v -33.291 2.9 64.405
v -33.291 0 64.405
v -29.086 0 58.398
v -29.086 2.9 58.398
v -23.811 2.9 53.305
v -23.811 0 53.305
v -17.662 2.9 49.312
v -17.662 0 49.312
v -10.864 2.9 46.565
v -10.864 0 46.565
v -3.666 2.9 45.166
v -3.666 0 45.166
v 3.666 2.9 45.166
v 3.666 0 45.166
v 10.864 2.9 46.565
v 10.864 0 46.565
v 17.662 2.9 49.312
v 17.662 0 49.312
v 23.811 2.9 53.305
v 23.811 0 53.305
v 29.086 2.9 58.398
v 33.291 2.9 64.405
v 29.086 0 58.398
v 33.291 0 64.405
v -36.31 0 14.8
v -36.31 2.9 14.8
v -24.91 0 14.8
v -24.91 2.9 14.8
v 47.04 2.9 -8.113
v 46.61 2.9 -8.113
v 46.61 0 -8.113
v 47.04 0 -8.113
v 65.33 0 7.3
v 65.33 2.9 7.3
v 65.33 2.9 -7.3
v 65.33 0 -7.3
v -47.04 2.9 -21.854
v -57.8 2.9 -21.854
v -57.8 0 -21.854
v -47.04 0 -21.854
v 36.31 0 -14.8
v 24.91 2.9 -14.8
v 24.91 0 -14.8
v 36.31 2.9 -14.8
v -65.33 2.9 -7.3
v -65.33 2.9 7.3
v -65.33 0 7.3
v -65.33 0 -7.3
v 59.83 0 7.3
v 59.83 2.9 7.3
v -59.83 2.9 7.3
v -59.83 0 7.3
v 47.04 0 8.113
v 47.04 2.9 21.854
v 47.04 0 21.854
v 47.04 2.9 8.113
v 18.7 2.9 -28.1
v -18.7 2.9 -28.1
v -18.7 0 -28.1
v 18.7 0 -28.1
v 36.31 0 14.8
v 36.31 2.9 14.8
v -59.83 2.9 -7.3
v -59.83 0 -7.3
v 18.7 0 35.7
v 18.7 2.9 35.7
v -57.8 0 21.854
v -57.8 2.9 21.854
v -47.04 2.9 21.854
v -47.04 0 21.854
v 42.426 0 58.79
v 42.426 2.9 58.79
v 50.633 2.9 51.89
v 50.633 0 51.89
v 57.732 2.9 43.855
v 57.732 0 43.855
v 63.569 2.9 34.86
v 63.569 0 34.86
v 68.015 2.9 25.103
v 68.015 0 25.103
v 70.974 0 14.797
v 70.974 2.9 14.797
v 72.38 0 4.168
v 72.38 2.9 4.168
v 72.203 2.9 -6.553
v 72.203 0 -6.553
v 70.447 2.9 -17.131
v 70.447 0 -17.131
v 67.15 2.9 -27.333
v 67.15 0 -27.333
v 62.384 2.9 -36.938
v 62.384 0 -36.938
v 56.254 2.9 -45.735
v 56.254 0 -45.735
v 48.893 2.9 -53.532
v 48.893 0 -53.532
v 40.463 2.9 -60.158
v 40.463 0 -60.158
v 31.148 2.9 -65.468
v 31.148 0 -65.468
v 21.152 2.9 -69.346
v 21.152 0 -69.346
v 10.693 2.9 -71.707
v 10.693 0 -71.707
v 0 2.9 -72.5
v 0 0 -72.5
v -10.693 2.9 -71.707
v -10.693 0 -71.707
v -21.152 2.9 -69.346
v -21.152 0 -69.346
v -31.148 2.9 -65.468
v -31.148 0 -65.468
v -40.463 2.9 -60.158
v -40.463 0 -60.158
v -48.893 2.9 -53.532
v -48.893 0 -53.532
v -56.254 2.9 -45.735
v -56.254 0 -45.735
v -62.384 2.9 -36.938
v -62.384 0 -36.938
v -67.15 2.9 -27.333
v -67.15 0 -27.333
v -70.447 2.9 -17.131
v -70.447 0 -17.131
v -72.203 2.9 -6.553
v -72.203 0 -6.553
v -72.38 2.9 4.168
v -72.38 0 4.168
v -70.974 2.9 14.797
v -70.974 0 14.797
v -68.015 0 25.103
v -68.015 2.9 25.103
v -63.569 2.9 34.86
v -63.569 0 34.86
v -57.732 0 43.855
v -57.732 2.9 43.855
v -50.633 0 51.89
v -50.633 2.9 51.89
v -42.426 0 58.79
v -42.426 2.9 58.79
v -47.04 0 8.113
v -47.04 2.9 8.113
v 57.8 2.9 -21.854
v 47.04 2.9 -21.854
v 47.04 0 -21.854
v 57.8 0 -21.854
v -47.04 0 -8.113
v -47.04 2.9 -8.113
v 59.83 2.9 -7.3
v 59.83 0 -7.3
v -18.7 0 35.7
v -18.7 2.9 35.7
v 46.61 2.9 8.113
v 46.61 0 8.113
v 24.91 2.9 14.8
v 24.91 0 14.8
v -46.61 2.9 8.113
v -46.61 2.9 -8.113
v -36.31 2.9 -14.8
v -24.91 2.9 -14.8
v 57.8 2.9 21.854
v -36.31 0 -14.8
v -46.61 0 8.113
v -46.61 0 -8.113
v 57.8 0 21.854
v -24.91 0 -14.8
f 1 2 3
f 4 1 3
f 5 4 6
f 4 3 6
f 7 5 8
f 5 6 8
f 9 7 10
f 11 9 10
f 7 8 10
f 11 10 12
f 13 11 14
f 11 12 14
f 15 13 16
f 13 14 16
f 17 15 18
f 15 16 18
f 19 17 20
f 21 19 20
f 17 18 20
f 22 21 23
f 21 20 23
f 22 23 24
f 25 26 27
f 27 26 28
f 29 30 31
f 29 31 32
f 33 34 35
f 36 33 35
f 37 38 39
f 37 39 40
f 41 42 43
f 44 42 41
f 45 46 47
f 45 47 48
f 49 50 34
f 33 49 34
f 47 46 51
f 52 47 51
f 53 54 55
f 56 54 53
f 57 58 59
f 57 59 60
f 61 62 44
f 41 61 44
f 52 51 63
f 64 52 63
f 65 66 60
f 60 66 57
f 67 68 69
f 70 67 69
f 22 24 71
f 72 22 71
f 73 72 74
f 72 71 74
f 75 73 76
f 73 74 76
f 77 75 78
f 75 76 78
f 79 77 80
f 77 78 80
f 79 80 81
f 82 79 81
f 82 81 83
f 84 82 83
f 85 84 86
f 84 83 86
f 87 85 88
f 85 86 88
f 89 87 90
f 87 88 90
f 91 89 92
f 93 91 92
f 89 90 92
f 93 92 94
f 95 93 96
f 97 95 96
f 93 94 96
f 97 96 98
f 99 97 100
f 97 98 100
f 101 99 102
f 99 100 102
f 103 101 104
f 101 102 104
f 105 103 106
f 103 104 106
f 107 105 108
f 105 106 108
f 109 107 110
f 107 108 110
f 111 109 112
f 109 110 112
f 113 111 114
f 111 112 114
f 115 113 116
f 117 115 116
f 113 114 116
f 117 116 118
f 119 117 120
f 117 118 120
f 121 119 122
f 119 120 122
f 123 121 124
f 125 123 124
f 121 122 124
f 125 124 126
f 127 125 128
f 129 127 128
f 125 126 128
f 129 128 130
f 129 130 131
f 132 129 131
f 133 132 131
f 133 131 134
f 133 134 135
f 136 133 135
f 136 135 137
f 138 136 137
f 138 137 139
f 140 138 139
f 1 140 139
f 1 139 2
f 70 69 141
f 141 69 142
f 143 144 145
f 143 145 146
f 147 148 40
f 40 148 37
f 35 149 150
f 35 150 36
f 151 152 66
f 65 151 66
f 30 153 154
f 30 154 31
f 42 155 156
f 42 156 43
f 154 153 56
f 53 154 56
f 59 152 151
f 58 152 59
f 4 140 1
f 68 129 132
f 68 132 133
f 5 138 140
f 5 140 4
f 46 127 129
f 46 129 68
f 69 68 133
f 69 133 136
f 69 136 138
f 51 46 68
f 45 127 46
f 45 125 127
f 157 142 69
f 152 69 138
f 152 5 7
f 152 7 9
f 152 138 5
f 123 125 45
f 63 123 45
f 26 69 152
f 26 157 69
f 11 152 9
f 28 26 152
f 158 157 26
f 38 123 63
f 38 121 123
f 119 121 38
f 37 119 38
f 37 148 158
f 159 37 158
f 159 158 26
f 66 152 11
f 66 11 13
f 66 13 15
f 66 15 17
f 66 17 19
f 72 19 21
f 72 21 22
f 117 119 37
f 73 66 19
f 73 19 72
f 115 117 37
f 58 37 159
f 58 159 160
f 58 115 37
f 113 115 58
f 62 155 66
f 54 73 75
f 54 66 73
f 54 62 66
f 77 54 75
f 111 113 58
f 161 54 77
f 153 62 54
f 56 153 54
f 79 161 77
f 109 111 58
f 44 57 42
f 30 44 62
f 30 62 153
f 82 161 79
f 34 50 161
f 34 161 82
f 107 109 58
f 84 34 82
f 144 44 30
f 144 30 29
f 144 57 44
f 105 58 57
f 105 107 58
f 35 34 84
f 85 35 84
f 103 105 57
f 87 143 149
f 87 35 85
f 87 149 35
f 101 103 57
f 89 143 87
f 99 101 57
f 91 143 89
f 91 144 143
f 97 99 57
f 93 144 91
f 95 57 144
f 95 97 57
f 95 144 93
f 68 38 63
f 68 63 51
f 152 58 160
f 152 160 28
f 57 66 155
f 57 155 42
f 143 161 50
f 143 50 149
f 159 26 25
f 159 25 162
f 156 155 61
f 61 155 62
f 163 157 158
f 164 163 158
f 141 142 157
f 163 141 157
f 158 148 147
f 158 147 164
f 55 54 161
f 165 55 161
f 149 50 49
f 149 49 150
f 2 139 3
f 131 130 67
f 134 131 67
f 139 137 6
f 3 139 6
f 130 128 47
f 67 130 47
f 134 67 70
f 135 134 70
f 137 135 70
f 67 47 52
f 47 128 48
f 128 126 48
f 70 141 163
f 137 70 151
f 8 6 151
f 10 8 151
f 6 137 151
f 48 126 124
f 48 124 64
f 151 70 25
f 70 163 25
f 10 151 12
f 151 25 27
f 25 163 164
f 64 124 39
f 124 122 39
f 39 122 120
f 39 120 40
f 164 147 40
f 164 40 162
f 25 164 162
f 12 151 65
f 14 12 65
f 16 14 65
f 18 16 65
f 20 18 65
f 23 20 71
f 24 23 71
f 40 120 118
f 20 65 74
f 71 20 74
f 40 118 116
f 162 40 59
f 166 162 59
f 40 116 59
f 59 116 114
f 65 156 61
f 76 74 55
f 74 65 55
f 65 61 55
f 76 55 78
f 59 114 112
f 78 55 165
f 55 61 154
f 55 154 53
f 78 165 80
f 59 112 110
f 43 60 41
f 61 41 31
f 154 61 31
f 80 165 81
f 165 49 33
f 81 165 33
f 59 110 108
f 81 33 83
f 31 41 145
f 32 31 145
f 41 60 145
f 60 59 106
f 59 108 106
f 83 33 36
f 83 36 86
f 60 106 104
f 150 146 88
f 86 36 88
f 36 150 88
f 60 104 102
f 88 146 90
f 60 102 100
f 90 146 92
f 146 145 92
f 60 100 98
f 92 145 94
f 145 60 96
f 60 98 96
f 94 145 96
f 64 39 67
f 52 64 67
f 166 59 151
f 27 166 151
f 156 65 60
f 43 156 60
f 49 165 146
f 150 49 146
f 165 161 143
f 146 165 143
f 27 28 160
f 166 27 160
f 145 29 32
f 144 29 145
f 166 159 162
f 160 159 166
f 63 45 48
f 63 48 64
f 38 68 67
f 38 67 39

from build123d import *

# Parameters (mm, degrees)
BOSS_EXTRUDE1_DEPTH  = 2.9
SOLENOID_PLACEMENT_W = 37.4
SOLENOID_PLACEMENT_H = 63.8
CUT_EXTRUDE1_DEPTH   = 103.571487266
SKETCH2_W            = 10.76
SKETCH2_H            = 43.707605188
CUT_EXTRUDE2_DEPTH   = 103.571487266
SKETCH3_W            = 11.4
SKETCH3_H            = 29.6
CUT_EXTRUDE3_DEPTH   = 103.571487266
SKETCH5_W            = 5.5
SKETCH5_H            = 14.6
CUT_EXTRUDE4_DEPTH   = 103.571487266
SKETCH6_W            = 0.73
SKETCH6_H            = 16.225619988
CUT_EXTRUDE5_DEPTH   = 103.571487266


with BuildPart() as part:
    # Sketch1 → Boss-Extrude1 (new body)
    with BuildSketch(Plane(origin=(0, 0, 0), x_dir=(1, 0, 0), z_dir=(0, 1, 0))):
        with BuildLine():
            ThreePointArc((33.29110537, -64.404598464), (0, 72.5), (-33.29110537, -64.404598464))
            ThreePointArc((-33.29110537, -64.404598464), (0, -44.989799638), (33.29110537, -64.404598464))
        make_face()
    extrude(amount=BOSS_EXTRUDE1_DEPTH)

    # solenoid placement → Cut-Extrude1 (cut, through all)
    with BuildSketch(Plane(origin=(0, 2.9, 0), x_dir=(1, 0, 0), z_dir=(0, 1, 0))):
        with Locations((0, -3.8)):
            Rectangle(SOLENOID_PLACEMENT_W, SOLENOID_PLACEMENT_H)
    extrude(amount=-CUT_EXTRUDE1_DEPTH, mode=Mode.SUBTRACT)

    # Sketch2 → Cut-Extrude2 (cut, through all)
    with BuildSketch(Plane(origin=(0, 2.9, 0), x_dir=(1, 0, 0), z_dir=(0, 1, 0))):
        with Locations((52.42, 0)):
            Rectangle(SKETCH2_W, SKETCH2_H)
        with Locations((-52.42, 0)):
            Rectangle(SKETCH2_W, SKETCH2_H)
    extrude(amount=-CUT_EXTRUDE2_DEPTH, mode=Mode.SUBTRACT)

    # Sketch3 → Cut-Extrude3 (cut, through all)
    with BuildSketch(Plane(origin=(0, 2.9, 0), x_dir=(1, 0, 0), z_dir=(0, 1, 0))):
        with Locations((-30.61, 0)):
            Rectangle(SKETCH3_W, SKETCH3_H)
        with Locations((30.61, 0)):
            Rectangle(SKETCH3_W, SKETCH3_H)
    extrude(amount=-CUT_EXTRUDE3_DEPTH, mode=Mode.SUBTRACT)

    # Sketch5 → Cut-Extrude4 (cut, through all)
    with BuildSketch(Plane(origin=(0, 2.9, 0), x_dir=(1, 0, 0), z_dir=(0, 1, 0))):
        with Locations((-62.58, 0)):
            Rectangle(SKETCH5_W, SKETCH5_H)
        with Locations((62.58, 0)):
            Rectangle(SKETCH5_W, SKETCH5_H)
    extrude(amount=-CUT_EXTRUDE4_DEPTH, mode=Mode.SUBTRACT)

    # Sketch6 → Cut-Extrude5 (cut, through all)
    with BuildSketch(Plane(origin=(0, 2.9, 0), x_dir=(1, 0, 0), z_dir=(0, 1, 0))):
        with Locations((-46.975, 0)):
            Rectangle(SKETCH6_W, SKETCH6_H)
        with Locations((46.975, 0)):
            Rectangle(SKETCH6_W, SKETCH6_H)
    extrude(amount=-CUT_EXTRUDE5_DEPTH, mode=Mode.SUBTRACT)


solid = part.part
